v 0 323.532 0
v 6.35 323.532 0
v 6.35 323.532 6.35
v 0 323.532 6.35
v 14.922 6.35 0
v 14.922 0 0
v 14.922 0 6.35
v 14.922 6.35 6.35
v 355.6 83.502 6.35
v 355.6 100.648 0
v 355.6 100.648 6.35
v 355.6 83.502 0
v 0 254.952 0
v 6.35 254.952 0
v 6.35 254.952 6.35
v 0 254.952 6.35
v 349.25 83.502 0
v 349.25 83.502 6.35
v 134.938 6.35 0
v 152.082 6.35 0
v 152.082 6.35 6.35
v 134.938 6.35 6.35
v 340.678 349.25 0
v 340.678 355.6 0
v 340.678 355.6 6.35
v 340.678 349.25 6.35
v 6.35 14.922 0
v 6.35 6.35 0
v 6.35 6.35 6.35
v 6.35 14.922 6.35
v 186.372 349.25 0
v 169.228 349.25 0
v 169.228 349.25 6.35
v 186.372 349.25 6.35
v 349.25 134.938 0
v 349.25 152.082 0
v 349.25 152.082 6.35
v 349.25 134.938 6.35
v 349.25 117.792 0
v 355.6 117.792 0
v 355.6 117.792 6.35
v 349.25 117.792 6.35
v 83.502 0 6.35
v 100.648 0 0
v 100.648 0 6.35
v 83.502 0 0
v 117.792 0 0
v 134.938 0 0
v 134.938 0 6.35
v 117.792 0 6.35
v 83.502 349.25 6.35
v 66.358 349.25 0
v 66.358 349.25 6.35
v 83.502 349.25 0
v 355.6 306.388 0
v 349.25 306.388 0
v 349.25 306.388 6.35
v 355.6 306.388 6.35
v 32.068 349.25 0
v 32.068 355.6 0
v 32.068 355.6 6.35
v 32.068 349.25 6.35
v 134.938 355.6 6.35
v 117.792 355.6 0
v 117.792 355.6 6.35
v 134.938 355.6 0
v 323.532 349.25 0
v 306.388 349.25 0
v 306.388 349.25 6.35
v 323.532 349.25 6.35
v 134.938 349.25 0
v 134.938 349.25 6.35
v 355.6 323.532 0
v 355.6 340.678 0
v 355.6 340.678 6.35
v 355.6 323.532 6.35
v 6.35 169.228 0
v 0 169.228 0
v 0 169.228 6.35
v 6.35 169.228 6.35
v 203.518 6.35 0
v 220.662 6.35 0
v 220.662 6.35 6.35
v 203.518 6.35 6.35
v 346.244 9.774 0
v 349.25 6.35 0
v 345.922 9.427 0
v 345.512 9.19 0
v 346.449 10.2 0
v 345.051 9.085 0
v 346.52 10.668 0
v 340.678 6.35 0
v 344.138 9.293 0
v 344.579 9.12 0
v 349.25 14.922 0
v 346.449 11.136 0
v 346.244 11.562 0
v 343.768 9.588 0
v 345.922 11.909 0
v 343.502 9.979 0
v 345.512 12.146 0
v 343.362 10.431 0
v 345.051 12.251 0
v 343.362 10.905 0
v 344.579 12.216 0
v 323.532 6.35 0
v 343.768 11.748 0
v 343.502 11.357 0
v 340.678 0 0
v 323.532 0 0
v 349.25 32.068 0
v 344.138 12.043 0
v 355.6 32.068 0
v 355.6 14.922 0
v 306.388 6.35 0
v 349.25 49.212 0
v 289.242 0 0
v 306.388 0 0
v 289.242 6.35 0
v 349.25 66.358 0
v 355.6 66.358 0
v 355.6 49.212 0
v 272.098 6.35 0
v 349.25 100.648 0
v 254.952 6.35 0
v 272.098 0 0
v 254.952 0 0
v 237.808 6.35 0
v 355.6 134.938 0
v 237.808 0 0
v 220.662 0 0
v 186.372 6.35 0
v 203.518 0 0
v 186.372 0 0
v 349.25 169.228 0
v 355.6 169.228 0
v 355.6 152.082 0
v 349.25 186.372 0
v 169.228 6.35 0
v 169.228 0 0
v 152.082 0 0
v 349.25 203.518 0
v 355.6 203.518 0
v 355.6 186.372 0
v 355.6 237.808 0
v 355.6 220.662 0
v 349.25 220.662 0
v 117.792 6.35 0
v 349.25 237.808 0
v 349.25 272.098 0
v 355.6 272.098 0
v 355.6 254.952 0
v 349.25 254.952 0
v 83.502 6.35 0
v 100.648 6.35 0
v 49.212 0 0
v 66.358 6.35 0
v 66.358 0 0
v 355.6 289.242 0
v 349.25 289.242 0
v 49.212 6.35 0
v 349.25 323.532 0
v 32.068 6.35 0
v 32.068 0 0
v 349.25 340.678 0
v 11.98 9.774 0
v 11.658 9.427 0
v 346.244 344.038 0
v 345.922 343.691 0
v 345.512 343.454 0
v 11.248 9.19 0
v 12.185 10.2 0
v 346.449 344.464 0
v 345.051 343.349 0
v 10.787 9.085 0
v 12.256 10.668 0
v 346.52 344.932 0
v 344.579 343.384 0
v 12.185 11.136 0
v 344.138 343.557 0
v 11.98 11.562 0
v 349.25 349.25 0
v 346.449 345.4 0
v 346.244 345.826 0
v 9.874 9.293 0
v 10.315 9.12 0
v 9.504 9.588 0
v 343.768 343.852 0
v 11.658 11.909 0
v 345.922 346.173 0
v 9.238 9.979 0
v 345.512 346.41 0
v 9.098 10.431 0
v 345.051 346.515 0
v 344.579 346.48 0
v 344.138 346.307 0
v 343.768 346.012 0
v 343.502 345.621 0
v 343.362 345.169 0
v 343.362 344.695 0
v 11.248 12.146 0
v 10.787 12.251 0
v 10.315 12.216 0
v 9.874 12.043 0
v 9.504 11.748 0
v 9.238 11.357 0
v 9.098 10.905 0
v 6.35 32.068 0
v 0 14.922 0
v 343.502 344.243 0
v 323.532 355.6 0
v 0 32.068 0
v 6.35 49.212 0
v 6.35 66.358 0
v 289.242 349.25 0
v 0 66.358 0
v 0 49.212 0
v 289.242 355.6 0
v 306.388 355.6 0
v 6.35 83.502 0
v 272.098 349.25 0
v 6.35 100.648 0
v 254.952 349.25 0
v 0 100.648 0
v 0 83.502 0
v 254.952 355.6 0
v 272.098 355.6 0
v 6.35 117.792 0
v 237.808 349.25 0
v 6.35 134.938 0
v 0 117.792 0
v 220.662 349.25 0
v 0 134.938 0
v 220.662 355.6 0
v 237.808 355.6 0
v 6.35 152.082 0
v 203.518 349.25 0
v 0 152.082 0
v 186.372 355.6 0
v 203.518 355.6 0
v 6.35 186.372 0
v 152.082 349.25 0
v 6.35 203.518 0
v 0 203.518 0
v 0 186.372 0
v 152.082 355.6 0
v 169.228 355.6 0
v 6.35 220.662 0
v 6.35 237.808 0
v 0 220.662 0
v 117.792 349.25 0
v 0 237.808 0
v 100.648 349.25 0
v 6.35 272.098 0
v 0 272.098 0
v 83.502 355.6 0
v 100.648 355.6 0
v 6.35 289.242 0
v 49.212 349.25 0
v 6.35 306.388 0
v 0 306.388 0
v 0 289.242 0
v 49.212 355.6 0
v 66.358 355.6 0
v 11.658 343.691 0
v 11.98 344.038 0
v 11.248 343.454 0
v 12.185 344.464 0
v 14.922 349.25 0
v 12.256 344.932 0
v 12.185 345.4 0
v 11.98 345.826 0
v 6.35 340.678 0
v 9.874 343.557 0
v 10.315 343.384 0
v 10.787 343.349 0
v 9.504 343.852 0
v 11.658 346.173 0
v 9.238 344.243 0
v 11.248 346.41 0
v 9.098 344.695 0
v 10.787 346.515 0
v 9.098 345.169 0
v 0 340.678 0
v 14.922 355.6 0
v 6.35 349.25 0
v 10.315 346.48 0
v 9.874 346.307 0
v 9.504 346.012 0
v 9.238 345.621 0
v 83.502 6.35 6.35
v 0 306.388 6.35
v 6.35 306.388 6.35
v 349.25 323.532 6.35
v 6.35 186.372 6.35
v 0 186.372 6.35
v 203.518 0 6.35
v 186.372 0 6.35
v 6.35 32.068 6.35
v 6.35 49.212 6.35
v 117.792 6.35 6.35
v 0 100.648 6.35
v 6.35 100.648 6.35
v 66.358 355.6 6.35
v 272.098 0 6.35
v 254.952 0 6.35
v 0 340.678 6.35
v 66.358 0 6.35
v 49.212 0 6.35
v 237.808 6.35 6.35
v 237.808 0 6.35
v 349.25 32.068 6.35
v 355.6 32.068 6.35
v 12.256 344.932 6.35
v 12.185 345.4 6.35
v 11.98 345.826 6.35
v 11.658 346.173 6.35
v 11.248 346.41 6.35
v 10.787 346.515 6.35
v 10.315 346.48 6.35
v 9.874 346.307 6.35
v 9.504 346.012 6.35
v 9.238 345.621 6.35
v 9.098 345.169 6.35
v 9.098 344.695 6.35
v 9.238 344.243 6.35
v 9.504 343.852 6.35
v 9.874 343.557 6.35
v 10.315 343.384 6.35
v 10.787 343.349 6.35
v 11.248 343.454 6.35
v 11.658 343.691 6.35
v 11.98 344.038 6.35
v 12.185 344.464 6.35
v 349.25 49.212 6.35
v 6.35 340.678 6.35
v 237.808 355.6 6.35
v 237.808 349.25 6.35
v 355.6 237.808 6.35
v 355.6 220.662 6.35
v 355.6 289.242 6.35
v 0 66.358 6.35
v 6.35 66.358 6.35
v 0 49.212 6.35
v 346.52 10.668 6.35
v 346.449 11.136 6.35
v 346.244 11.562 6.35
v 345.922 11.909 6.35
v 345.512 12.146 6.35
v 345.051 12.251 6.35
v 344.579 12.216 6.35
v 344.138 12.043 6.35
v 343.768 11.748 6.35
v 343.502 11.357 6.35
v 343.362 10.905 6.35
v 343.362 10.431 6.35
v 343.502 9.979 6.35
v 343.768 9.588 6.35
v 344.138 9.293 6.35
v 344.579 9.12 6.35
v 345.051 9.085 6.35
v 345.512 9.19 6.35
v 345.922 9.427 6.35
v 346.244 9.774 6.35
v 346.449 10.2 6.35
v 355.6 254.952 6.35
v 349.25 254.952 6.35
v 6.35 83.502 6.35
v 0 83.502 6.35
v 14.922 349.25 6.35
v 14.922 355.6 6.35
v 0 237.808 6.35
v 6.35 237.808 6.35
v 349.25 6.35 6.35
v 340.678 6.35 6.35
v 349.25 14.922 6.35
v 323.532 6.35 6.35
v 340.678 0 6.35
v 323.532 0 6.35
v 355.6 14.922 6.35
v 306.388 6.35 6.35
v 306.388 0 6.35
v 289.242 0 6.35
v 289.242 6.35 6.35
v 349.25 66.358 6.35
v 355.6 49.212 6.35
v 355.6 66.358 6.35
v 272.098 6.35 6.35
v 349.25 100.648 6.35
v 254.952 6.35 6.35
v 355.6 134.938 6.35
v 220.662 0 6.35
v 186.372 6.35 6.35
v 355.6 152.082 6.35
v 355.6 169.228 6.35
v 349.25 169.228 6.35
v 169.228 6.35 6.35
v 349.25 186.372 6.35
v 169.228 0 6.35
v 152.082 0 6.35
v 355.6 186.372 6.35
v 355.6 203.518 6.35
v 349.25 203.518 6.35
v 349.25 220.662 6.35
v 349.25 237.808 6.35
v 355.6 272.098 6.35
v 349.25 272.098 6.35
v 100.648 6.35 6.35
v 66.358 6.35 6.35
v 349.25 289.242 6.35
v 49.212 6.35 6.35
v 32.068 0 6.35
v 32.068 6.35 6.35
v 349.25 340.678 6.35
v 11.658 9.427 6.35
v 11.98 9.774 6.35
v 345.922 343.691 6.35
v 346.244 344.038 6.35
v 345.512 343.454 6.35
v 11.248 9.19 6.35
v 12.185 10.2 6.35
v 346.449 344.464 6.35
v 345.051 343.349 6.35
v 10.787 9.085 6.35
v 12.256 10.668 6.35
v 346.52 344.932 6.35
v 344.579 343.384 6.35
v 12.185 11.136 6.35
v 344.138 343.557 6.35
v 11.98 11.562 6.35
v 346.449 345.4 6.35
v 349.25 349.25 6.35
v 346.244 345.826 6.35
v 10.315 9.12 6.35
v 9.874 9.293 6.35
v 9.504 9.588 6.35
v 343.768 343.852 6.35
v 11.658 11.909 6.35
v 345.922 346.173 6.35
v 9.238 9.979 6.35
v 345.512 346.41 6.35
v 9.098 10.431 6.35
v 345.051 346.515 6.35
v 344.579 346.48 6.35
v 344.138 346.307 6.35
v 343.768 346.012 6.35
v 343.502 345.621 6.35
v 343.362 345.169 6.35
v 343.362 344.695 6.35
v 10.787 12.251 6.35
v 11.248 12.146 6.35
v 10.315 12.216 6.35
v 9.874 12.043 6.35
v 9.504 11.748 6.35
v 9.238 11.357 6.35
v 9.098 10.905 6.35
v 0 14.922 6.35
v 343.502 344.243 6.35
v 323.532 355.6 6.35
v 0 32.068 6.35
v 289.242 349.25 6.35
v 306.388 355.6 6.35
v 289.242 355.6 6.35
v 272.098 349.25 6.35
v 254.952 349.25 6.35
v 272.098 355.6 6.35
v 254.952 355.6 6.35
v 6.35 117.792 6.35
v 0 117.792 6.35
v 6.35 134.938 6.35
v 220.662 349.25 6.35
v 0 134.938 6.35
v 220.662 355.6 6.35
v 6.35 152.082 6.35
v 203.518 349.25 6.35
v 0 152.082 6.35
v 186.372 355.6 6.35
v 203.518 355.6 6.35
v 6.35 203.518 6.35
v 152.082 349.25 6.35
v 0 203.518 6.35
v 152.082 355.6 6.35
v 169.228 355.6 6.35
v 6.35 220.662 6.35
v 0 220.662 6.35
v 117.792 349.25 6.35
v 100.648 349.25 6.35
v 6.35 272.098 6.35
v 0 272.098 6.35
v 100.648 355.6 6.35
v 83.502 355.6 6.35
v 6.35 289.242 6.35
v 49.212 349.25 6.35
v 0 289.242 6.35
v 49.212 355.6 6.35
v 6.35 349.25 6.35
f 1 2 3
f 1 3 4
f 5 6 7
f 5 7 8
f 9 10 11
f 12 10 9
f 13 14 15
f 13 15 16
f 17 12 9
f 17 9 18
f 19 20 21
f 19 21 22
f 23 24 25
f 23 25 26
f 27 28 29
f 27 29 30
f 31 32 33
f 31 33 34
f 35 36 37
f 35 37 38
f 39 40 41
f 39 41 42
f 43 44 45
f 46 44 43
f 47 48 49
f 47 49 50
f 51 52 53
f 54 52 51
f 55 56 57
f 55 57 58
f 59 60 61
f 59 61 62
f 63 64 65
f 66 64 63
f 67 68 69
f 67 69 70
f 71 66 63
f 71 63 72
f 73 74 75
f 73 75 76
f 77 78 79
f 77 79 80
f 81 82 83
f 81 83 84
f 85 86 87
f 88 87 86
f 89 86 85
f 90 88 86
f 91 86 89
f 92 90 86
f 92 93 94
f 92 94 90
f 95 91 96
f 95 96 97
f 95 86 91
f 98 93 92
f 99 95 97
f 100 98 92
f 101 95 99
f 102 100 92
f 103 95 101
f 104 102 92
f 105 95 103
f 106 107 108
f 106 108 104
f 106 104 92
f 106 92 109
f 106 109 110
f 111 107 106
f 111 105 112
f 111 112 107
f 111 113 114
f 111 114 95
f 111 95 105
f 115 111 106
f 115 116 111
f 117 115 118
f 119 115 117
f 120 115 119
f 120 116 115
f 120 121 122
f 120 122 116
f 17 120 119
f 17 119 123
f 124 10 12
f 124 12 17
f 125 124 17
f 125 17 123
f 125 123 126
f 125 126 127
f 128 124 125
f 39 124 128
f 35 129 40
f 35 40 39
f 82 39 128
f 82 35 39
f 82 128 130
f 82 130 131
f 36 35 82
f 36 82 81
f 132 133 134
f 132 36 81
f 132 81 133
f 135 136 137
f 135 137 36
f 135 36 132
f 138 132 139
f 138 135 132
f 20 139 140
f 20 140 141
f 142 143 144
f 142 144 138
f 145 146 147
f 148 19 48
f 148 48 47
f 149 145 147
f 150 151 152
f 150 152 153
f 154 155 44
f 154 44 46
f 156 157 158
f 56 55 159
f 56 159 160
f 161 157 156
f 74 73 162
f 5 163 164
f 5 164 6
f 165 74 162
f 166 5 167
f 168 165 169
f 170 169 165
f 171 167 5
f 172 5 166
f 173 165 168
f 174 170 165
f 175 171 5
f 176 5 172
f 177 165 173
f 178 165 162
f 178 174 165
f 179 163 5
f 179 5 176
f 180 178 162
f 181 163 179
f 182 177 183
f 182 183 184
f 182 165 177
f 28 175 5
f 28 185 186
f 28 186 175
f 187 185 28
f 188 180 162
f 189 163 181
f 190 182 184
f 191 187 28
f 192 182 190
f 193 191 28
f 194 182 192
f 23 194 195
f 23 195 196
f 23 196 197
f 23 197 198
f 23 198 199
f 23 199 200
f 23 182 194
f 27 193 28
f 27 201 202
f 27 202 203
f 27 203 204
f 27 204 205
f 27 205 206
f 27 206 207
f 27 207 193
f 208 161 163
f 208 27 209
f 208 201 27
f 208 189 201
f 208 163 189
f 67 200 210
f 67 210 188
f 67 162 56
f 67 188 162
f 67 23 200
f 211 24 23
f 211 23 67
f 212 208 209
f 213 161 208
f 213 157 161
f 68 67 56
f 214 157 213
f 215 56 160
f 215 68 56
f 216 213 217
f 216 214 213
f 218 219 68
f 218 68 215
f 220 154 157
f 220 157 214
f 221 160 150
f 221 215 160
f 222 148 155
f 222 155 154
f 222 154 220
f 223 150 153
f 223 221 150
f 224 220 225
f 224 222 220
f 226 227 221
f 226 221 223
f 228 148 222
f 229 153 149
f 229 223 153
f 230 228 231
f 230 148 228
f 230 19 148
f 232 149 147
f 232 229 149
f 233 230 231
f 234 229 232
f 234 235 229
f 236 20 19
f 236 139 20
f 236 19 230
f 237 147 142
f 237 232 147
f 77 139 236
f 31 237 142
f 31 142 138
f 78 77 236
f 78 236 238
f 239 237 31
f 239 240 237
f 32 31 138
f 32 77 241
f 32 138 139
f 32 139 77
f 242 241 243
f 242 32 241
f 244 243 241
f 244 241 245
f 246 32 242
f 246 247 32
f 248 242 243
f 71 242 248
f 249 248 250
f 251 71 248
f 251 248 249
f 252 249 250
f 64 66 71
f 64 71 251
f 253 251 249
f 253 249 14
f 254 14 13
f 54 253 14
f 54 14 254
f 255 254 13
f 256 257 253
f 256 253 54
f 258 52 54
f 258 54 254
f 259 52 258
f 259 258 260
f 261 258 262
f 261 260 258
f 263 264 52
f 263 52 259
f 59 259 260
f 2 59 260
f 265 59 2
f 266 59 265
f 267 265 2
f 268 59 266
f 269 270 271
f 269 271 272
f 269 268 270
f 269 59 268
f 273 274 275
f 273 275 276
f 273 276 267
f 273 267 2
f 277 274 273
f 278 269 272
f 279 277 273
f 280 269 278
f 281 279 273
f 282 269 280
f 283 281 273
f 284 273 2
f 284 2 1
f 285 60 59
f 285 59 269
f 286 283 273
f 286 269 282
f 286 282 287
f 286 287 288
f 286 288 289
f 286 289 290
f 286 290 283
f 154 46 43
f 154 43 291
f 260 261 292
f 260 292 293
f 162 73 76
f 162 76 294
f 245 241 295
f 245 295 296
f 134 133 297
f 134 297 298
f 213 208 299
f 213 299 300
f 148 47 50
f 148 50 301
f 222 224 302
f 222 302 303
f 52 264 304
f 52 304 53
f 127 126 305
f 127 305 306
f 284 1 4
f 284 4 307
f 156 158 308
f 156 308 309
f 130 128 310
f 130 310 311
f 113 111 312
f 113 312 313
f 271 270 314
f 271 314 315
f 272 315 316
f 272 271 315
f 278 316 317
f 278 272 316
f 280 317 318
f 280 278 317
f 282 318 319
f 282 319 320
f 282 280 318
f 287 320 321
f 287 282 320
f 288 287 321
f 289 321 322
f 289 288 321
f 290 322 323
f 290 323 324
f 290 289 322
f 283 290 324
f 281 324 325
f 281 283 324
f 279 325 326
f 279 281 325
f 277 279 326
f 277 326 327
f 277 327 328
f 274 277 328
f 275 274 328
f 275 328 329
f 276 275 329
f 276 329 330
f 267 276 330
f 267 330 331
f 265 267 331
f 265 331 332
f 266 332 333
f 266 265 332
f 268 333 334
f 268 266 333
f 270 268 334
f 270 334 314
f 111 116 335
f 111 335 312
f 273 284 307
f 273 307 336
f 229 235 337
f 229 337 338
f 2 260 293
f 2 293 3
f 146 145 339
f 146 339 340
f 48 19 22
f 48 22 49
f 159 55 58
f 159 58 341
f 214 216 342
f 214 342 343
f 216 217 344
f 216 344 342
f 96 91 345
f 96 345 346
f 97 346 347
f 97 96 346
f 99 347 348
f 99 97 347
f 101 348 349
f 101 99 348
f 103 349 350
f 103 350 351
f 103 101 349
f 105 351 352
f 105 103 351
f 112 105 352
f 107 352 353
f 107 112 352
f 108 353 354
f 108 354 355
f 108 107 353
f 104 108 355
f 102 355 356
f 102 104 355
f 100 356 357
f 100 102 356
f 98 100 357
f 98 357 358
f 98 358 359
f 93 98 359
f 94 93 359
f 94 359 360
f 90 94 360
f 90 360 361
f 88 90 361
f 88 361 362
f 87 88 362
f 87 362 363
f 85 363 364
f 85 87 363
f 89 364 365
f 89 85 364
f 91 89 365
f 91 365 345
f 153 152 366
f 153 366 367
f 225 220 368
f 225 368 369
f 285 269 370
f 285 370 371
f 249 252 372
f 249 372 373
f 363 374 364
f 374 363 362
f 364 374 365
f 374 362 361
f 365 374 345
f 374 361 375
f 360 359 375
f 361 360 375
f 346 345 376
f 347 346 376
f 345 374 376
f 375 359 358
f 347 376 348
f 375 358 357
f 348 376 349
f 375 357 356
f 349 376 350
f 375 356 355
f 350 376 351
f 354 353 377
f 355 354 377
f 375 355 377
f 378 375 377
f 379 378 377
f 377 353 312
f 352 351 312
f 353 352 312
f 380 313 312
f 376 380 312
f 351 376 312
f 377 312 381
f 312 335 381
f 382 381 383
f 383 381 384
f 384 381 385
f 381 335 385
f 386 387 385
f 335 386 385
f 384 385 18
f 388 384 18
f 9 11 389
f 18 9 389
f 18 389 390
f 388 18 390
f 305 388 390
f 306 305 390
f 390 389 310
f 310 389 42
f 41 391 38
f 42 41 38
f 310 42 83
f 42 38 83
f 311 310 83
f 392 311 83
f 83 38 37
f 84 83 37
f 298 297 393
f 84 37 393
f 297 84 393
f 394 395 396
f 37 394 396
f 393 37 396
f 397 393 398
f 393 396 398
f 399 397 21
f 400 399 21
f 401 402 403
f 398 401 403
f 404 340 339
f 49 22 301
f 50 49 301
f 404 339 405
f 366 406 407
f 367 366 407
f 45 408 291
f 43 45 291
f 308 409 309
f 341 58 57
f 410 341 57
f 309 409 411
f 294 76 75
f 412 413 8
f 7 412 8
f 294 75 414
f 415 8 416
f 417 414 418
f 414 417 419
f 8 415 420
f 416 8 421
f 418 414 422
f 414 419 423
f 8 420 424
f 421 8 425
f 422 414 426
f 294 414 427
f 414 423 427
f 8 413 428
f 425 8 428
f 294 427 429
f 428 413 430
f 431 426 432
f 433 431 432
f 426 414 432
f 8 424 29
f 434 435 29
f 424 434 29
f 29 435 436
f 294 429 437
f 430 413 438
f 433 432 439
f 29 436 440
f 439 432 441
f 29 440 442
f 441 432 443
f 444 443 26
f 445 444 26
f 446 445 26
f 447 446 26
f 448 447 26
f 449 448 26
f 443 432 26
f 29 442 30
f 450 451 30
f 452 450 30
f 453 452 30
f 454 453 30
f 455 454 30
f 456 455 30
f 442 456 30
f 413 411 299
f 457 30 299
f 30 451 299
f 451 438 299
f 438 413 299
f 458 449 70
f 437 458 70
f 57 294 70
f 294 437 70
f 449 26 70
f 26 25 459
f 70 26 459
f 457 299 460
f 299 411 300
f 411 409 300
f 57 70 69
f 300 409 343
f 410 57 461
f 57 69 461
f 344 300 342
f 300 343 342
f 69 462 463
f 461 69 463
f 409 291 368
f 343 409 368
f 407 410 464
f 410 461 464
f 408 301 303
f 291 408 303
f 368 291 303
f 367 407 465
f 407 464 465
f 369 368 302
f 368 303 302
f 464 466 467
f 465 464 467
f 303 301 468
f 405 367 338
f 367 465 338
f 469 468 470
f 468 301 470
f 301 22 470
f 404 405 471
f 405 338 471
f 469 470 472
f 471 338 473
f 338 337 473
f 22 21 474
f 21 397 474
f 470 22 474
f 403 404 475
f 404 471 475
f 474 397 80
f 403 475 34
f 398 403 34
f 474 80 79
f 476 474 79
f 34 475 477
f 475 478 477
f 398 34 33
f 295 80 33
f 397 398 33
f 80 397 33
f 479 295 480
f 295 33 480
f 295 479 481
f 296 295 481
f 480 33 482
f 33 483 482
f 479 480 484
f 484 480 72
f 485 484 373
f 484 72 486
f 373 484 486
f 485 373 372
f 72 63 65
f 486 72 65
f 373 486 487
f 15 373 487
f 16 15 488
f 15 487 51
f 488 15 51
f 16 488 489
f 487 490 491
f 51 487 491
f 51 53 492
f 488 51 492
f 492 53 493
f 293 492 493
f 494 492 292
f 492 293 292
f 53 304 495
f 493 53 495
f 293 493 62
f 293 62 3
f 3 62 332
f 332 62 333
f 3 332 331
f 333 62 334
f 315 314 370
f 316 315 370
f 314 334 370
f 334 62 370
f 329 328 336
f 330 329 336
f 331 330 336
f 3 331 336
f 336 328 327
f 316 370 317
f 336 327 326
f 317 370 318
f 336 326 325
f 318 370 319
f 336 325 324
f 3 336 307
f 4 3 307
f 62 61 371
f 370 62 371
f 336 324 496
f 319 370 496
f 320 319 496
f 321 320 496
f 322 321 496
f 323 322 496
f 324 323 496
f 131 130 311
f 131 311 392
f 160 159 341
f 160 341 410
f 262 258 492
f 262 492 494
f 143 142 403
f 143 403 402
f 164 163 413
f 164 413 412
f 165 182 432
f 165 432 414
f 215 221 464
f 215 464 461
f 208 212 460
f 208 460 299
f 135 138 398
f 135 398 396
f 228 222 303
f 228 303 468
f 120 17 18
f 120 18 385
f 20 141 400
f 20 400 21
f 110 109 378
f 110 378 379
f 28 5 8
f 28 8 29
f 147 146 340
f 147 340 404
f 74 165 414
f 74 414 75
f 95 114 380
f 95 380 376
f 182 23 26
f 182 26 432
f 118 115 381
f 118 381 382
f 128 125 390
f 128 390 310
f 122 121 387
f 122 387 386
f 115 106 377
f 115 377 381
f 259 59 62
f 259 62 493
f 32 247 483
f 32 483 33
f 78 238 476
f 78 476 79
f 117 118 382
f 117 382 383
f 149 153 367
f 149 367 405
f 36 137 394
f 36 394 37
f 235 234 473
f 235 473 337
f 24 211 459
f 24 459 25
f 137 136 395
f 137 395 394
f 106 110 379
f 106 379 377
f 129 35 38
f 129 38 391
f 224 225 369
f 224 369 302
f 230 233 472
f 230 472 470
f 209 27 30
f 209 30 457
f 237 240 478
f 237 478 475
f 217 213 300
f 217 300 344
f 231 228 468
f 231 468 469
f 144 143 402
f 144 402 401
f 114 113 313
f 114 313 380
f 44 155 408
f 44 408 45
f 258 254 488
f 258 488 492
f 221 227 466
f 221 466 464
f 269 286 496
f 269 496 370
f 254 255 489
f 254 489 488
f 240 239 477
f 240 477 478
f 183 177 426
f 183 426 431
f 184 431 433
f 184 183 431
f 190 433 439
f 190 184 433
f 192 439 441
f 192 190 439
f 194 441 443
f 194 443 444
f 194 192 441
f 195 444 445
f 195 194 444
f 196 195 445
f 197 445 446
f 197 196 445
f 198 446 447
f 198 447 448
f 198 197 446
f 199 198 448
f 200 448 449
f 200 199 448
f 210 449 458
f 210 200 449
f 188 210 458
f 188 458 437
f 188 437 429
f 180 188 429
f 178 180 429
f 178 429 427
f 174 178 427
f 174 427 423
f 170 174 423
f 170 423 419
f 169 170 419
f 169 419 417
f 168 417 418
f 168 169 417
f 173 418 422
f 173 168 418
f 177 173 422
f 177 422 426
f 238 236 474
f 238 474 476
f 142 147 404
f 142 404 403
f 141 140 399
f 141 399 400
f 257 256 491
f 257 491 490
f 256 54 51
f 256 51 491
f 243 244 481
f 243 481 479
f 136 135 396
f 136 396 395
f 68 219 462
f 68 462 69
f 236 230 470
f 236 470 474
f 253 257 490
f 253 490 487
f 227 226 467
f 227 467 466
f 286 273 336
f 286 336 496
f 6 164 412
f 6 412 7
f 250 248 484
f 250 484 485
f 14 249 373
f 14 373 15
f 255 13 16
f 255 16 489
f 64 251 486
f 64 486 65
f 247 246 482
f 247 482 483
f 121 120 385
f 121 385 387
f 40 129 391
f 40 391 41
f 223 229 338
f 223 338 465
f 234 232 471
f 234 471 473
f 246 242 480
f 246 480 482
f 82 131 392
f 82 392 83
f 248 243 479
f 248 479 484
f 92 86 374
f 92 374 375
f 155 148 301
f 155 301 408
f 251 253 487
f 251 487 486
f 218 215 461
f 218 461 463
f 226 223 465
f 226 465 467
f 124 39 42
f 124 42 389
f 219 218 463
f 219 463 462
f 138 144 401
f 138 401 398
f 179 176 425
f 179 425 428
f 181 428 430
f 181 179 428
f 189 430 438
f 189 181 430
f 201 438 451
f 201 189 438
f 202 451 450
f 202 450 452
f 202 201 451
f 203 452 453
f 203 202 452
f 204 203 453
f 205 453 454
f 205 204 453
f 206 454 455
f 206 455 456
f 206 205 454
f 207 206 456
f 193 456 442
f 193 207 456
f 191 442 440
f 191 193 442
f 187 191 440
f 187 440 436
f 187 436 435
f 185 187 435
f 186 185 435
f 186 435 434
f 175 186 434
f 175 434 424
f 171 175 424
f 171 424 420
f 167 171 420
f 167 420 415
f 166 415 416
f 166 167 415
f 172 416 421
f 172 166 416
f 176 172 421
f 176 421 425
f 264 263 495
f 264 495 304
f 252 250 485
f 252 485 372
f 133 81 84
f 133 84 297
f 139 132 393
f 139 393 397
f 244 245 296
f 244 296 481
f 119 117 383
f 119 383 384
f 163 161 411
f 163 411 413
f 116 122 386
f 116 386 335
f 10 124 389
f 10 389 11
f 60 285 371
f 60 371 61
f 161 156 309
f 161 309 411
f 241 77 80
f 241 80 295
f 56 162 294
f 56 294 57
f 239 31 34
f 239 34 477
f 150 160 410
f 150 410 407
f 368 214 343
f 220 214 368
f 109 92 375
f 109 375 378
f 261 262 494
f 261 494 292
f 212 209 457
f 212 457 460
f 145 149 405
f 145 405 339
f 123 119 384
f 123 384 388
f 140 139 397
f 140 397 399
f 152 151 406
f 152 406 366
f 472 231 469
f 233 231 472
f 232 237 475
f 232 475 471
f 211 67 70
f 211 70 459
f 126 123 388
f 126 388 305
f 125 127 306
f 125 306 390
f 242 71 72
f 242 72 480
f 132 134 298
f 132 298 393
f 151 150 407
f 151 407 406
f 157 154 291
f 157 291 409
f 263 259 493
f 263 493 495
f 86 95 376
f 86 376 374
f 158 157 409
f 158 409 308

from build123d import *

# Parameters (mm, degrees)
SKETCH1_R           = 1.5875
BOSS_EXTRUDE1_DEPTH = 6.35


with BuildPart() as part:
    # Sketch1 → Boss-Extrude1 (new body)
    with BuildSketch(Plane.XY):
        Polygon((6.35, 349.25), (14.9225, 349.25), (14.9225, 355.6), (32.0675, 355.6), (32.0675, 349.25), (49.2125, 349.25), (49.2125, 355.6), (66.3575, 355.6), (66.3575, 349.25), (83.5025, 349.25), (83.5025, 355.6), (100.6475, 355.6), (100.6475, 349.25), (117.7925, 349.25), (117.7925, 355.6), (134.9375, 355.6), (134.9375, 349.25), (152.0825, 349.25), (152.0825, 355.6), (169.2275, 355.6), (169.2275, 349.25), (186.3725, 349.25), (186.3725, 355.6), (203.5175, 355.6), (203.5175, 349.25), (220.6625, 349.25), (220.6625, 355.6), (237.8075, 355.6), (237.8075, 349.25), (254.9525, 349.25), (254.9525, 355.6), (272.0975, 355.6), (272.0975, 349.25), (289.2425, 349.25), (289.2425, 355.6), (306.3875, 355.6), (306.3875, 349.25), (323.5325, 349.25), (323.5325, 355.6), (340.6775, 355.6), (340.6775, 349.25), (349.25, 349.25), (349.25, 340.6775), (355.6, 340.6775), (355.6, 323.5325), (349.25, 323.5325), (349.25, 306.3875), (355.6, 306.3875), (355.6, 289.2425), (349.25, 289.2425), (349.25, 272.0975), (355.6, 272.0975), (355.6, 254.9525), (349.25, 254.9525), (349.25, 237.8075), (355.6, 237.8075), (355.6, 220.6625), (349.25, 220.6625), (349.25, 203.5175), (355.6, 203.5175), (355.6, 186.3725), (349.25, 186.3725), (349.25, 169.2275), (355.6, 169.2275), (355.6, 152.0825), (349.25, 152.0825), (349.25, 134.9375), (355.6, 134.9375), (355.6, 117.7925), (349.25, 117.7925), (349.25, 100.6475), (355.6, 100.6475), (355.6, 83.5025), (349.25, 83.5025), (349.25, 66.3575), (355.6, 66.3575), (355.6, 49.2125), (349.25, 49.2125), (349.25, 32.0675), (355.6, 32.0675), (355.6, 14.9225), (349.25, 14.9225), (349.25, 6.35), (340.6775, 6.35), (340.6775, 0), (323.5325, 0), (323.5325, 6.35), (306.3875, 6.35), (306.3875, 0), (289.2425, 0), (289.2425, 6.35), (272.0975, 6.35), (272.0975, 0), (254.9525, 0), (254.9525, 6.35), (237.8075, 6.35), (237.8075, 0), (220.6625, 0), (220.6625, 6.35), (203.5175, 6.35), (203.5175, 0), (186.3725, 0), (186.3725, 6.35), (169.2275, 6.35), (169.2275, 0), (152.0825, 0), (152.0825, 6.35), (134.9375, 6.35), (134.9375, 0), (117.7925, 0), (117.7925, 6.35), (100.6475, 6.35), (100.6475, 0), (83.5025, 0), (83.5025, 6.35), (66.3575, 6.35), (66.3575, 0), (49.2125, 0), (49.2125, 6.35), (32.0675, 6.35), (32.0675, 0), (14.9225, 0), (14.9225, 6.35), (6.35, 6.35), (6.35, 14.9225), (0, 14.9225), (0, 32.0675), (6.35, 32.0675), (6.35, 49.2125), (0, 49.2125), (0, 66.3575), (6.35, 66.3575), (6.35, 83.5025), (0, 83.5025), (0, 100.6475), (6.35, 100.6475), (6.35, 117.7925), (0, 117.7925), (0, 134.9375), (6.35, 134.9375), (6.35, 152.0825), (0, 152.0825), (0, 169.2275), (6.35, 169.2275), (6.35, 186.3725), (0, 186.3725), (0, 203.5175), (6.35, 203.5175), (6.35, 220.6625), (0, 220.6625), (0, 237.8075), (6.35, 237.8075), (6.35, 254.9525), (0, 254.9525), (0, 272.0975), (6.35, 272.0975), (6.35, 289.2425), (0, 289.2425), (0, 306.3875), (6.35, 306.3875), (6.35, 323.5325), (0, 323.5325), (0, 340.6775), (6.35, 340.6775), align=None)
        with Locations((10.668, 344.932)):
            Circle(SKETCH1_R, mode=Mode.SUBTRACT)
        with Locations((344.932, 344.932)):
            Circle(SKETCH1_R, mode=Mode.SUBTRACT)
        with Locations((344.932, 10.668)):
            Circle(SKETCH1_R, mode=Mode.SUBTRACT)
        with Locations((10.668, 10.668)):
            Circle(SKETCH1_R, mode=Mode.SUBTRACT)
    extrude(amount=BOSS_EXTRUDE1_DEPTH)


solid = part.part
